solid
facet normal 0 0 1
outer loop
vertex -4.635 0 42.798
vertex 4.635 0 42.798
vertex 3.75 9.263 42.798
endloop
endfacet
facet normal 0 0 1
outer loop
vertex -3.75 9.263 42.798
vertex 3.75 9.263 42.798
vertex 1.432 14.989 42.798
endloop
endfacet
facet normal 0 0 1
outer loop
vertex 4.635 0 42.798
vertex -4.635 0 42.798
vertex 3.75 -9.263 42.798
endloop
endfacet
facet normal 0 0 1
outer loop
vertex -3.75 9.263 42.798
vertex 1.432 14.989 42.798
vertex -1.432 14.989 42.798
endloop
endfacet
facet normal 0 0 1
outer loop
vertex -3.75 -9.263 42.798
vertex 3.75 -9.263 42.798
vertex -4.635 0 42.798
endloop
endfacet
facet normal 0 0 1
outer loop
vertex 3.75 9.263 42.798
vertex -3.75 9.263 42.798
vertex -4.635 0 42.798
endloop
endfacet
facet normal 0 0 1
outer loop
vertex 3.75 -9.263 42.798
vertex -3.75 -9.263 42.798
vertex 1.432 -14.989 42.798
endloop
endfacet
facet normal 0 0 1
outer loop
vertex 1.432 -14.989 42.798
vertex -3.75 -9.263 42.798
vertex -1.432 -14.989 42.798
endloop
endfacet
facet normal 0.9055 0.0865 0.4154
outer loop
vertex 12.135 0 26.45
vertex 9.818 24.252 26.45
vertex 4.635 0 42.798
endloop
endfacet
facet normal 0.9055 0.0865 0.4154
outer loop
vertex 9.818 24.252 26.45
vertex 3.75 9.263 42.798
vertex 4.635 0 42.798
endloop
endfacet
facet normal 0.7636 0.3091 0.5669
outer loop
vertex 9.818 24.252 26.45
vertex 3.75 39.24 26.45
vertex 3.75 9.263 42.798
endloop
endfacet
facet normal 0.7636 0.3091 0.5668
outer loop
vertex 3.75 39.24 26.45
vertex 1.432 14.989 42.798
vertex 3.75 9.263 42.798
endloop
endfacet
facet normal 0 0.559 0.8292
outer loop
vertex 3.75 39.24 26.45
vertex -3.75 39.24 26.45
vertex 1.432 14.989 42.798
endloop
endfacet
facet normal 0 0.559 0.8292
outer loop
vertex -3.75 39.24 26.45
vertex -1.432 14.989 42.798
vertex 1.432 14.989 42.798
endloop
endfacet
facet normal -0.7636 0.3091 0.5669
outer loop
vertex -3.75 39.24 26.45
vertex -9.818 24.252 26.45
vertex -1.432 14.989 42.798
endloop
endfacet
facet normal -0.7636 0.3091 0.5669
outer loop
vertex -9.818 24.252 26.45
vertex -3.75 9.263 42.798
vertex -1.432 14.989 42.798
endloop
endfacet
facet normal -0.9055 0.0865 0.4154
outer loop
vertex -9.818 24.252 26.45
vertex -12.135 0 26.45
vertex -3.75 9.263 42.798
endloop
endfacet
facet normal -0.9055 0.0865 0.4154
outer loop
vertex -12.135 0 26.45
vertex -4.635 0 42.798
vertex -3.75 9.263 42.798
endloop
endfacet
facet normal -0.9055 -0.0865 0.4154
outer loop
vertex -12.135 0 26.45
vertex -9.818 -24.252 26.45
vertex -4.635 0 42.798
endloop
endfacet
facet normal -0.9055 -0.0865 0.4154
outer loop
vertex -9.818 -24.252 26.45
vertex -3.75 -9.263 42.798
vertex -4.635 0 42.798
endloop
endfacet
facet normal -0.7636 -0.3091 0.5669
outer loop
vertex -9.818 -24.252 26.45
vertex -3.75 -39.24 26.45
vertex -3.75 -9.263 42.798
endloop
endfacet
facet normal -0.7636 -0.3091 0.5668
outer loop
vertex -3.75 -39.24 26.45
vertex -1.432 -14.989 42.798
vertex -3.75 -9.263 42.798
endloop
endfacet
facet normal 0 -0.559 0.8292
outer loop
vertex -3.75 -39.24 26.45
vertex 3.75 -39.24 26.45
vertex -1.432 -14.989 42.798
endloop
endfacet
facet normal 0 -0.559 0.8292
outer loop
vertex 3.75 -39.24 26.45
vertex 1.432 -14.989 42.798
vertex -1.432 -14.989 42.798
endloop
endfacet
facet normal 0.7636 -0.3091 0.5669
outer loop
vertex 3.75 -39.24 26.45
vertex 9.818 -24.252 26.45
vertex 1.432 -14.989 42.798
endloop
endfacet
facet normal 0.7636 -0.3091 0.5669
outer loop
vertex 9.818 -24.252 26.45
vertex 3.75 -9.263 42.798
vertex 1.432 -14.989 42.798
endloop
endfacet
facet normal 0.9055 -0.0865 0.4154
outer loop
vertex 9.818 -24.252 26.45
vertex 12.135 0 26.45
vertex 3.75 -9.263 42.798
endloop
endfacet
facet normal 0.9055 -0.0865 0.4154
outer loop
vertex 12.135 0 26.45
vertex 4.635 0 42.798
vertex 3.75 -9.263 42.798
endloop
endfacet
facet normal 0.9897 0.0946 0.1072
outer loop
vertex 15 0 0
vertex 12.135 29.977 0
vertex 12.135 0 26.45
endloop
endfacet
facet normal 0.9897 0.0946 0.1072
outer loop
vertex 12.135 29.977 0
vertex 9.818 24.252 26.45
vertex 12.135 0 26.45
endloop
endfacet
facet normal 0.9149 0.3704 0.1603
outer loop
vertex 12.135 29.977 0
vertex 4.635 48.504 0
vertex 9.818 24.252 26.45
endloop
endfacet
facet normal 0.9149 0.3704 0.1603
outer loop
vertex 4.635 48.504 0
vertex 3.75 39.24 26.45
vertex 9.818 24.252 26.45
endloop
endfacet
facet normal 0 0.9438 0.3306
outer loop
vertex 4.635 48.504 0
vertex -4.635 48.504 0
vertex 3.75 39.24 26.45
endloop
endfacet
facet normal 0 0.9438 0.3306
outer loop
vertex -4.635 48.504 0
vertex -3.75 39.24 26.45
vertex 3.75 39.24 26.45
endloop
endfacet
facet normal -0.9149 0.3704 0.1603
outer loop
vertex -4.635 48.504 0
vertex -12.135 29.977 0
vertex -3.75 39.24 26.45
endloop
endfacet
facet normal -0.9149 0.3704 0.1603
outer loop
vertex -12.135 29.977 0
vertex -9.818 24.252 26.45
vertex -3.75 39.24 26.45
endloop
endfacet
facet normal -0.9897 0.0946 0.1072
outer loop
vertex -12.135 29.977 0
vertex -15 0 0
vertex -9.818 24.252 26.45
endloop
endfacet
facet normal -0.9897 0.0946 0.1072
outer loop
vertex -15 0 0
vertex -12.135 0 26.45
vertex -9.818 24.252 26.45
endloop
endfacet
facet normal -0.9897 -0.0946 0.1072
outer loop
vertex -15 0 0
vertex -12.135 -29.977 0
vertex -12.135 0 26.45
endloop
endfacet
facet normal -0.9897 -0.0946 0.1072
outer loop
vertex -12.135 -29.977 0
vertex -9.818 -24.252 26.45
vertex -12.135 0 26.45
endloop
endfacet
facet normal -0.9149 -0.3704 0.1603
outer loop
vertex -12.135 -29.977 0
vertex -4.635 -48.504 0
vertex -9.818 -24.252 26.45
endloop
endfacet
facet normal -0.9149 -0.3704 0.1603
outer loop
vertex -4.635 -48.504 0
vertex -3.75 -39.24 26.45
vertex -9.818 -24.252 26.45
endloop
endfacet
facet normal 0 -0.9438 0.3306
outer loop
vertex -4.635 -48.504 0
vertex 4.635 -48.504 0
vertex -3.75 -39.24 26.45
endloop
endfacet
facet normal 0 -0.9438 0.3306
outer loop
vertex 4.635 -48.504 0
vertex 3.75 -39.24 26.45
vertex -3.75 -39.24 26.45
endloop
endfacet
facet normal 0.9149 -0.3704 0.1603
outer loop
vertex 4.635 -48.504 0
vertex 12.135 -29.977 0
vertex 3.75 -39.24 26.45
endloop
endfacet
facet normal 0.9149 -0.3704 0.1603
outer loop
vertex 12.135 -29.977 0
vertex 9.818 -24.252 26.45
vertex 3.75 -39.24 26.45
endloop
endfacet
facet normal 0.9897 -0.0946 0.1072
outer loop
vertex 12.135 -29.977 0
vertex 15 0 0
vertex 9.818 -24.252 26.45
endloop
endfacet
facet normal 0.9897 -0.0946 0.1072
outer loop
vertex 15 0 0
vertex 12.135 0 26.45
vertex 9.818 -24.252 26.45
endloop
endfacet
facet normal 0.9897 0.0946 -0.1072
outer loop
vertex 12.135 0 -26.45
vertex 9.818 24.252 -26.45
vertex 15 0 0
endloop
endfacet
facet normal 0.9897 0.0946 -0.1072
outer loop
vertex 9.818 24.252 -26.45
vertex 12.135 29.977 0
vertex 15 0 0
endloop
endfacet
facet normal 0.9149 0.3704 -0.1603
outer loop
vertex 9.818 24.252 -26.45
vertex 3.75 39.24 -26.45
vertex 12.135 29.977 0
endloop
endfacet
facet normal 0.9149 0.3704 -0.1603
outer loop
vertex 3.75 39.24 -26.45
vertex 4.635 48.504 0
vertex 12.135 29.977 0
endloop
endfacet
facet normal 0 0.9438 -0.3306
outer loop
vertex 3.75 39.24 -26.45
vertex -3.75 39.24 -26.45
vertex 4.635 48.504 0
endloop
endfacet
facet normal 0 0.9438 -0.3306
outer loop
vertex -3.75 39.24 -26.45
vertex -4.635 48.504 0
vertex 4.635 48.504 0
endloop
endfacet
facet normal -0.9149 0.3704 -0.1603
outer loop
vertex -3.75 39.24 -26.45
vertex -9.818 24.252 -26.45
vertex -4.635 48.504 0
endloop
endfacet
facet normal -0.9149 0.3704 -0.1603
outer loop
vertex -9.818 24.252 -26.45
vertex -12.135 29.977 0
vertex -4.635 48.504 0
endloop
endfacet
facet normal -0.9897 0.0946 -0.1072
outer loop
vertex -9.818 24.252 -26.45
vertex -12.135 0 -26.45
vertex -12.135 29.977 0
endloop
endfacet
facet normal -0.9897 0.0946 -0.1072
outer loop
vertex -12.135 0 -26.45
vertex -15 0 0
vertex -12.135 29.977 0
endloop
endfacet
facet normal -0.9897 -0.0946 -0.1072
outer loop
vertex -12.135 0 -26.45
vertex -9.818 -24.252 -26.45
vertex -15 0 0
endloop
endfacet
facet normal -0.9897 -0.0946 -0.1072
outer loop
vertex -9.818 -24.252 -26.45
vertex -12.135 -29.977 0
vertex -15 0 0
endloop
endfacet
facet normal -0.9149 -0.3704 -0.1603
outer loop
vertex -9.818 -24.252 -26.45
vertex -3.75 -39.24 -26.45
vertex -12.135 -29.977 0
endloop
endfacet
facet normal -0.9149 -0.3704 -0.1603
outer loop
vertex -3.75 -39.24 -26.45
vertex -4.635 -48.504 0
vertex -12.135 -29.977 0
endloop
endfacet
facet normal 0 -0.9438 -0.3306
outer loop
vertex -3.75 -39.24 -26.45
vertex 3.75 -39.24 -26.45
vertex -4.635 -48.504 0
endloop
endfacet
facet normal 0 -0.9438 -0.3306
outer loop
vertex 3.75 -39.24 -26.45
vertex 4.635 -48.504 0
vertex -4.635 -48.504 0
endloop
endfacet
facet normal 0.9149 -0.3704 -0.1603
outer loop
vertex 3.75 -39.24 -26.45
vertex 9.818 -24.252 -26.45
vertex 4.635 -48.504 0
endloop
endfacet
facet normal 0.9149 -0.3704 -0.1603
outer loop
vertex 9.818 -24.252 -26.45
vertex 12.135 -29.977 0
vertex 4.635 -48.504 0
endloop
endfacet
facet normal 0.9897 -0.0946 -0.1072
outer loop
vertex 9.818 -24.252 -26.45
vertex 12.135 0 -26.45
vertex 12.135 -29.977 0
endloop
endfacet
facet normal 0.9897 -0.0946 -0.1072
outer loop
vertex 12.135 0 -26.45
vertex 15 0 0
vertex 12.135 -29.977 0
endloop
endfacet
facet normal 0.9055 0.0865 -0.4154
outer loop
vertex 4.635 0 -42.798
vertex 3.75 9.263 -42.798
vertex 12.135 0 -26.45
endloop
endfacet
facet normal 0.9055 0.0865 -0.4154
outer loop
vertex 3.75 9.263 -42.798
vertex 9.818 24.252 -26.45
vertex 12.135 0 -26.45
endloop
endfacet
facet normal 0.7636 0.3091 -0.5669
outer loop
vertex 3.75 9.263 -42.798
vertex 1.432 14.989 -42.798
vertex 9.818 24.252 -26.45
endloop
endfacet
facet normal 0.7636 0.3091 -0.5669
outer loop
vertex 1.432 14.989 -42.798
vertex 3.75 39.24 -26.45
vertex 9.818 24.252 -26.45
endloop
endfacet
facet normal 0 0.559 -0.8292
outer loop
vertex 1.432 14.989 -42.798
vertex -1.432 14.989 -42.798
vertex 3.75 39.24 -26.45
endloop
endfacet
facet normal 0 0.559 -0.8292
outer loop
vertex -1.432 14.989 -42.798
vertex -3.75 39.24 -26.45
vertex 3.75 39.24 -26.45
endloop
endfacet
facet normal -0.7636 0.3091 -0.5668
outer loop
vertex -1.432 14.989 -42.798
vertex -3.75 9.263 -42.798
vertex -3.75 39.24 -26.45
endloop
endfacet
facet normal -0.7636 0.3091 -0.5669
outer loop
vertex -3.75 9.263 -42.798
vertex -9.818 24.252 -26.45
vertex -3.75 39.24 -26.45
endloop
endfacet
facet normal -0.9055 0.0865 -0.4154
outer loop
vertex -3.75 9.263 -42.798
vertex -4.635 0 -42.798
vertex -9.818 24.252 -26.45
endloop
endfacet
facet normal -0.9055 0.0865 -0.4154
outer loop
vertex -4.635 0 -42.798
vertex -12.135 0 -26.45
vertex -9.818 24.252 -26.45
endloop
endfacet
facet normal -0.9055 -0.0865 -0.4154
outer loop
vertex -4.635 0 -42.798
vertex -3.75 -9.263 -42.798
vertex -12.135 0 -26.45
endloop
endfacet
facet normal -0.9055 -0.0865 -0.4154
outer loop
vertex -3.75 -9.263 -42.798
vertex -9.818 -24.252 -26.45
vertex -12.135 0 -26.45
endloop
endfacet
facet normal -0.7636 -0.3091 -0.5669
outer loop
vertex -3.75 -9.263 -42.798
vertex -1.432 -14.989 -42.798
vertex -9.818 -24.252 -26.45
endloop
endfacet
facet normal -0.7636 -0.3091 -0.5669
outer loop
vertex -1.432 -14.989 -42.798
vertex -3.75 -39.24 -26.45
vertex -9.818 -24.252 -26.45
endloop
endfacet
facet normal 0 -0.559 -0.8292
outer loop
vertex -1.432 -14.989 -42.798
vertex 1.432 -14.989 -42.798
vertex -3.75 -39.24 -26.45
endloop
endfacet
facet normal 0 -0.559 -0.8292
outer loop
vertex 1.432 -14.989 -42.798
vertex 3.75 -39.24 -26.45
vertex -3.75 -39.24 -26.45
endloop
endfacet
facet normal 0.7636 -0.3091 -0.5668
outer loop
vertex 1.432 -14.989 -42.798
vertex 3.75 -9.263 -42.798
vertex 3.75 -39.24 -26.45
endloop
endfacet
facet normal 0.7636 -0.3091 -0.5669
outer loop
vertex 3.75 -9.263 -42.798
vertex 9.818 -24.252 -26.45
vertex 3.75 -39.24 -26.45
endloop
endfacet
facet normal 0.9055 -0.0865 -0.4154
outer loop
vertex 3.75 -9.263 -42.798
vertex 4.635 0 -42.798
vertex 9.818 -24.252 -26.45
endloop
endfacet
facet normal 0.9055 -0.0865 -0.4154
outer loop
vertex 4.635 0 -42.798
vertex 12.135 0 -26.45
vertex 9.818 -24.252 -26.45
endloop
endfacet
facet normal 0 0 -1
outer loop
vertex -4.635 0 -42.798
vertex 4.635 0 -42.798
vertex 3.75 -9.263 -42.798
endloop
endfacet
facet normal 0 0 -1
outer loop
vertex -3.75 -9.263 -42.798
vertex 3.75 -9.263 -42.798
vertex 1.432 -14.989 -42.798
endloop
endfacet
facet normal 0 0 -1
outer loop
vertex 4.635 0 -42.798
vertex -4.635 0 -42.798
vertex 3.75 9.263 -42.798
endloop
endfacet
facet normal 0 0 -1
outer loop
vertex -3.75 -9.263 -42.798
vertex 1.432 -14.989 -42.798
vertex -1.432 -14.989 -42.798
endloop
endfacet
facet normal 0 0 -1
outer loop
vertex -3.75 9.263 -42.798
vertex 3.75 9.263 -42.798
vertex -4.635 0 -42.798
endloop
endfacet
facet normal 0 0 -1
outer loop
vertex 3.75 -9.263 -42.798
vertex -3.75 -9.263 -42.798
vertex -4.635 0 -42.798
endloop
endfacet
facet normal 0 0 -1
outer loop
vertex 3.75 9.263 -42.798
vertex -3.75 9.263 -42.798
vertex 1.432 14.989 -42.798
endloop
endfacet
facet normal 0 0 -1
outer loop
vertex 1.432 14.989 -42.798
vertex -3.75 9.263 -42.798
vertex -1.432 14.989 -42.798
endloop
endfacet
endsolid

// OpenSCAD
// Generated by SolidPython 1.0.1 on 2020-07-29 00:46:47


scale(v = [5, 17, 15]) {
	sphere(r = 3);
}
/***********************************************
*********      SolidPython code:      **********
************************************************
 
# import packages: SolidPython
from solid import *
from solid.utils import *
from itertools import chain, combinations, permutations


class Resize:

    def __init__(self, scad_file):
        self.scad_file = scad_file
        #self.scad_file = import_scad(scad_file)
        # cone/cylinder param:
        self.r1 = 0
        self.r2 = 0
        self.h = 0
        # rectangular prism param:
        self.w = 0
        self.l = 0
        # ellipse param:
        self.r = 0

    # import OpenScad code (file name corresponds to shape)


    # classify shape + parameters
    def assign(self, param1, param2, param3):
        if self.scad_file == 'cone.scad':
            self.r1 = param1
            self.r2 = param2
            self.h = param3
        elif self.scad_file == 'cylinder.scad':
            self.r1 = param1
            self.r2 = param2
            self.h = param3
        elif self.scad_file == 'rectangularPrism.scad':
            self.h = param1
            self.l = param2
            self.w = param3
        else:
            self.r = param1
            self.h = param2

    # resize parameters
    def iterate(self):
        x = range(3, 20, 2)
        i = 1
        if self.scad_file == 'cone.scad':
            tempList = list(permutations(x, 2))
            for temp in tempList:
                param1 = temp[0]
                param2 = temp[1]
                filepath = 'produced_scad_files/' + 'cone' + str(param1) + '_' + str(param2) + '_' + '.scad'
                scad_render_to_file(cylinder(h=param1, r1=param2, r2=0), filepath)

        elif self.scad_file == 'cylinder.scad':
            tempList = list(permutations(x, 3))
            for temp in tempList:
                param1 = temp[0]
                param2 = temp[1]
                filepath = 'produced_scad_files/' + 'cylinder' + str(param1) + '_' + str(param2) + '_' + '.scad'
                scad_render_to_file(cylinder(h=param1, r1=param2, r2=param2), filepath)

        elif self.scad_file == 'rectangularPrism.scad':
            tempList = list(permutations(x, 3))
            for temp in tempList:
                param1 = temp[0]
                param2 = temp[1]
                param3 = temp[2]
                filepath = 'produced_scad_files/' + 'rectangularPrism' + str(param1) + '_' + str(param2) + '_' + str(
                    param3) + '.scad'
                scad_render_to_file(cube(size=(param1, param2, param3)), filepath)

        elif self.scad_file == 'ellipse.scad':
            tempList = list(permutations(x, 4))
            for temp in tempList:
                param1 = temp[0]
                param2 = temp[1]
                param3 = temp[2]
                param4 = temp[3]
                filepath = 'produced_scad_files/' + 'ellipse' + str(param1) + '_' + str(param2) + '_' + str(param3) + '_' + str(param4) + '.scad'
                scad_render_to_file(scale([param1, param2, param3])(sphere(r=param4)), filepath)

    def render_to_scadfile(self):
        scad_render_to_file(scad, 'example.scad') 
 
************************************************/
